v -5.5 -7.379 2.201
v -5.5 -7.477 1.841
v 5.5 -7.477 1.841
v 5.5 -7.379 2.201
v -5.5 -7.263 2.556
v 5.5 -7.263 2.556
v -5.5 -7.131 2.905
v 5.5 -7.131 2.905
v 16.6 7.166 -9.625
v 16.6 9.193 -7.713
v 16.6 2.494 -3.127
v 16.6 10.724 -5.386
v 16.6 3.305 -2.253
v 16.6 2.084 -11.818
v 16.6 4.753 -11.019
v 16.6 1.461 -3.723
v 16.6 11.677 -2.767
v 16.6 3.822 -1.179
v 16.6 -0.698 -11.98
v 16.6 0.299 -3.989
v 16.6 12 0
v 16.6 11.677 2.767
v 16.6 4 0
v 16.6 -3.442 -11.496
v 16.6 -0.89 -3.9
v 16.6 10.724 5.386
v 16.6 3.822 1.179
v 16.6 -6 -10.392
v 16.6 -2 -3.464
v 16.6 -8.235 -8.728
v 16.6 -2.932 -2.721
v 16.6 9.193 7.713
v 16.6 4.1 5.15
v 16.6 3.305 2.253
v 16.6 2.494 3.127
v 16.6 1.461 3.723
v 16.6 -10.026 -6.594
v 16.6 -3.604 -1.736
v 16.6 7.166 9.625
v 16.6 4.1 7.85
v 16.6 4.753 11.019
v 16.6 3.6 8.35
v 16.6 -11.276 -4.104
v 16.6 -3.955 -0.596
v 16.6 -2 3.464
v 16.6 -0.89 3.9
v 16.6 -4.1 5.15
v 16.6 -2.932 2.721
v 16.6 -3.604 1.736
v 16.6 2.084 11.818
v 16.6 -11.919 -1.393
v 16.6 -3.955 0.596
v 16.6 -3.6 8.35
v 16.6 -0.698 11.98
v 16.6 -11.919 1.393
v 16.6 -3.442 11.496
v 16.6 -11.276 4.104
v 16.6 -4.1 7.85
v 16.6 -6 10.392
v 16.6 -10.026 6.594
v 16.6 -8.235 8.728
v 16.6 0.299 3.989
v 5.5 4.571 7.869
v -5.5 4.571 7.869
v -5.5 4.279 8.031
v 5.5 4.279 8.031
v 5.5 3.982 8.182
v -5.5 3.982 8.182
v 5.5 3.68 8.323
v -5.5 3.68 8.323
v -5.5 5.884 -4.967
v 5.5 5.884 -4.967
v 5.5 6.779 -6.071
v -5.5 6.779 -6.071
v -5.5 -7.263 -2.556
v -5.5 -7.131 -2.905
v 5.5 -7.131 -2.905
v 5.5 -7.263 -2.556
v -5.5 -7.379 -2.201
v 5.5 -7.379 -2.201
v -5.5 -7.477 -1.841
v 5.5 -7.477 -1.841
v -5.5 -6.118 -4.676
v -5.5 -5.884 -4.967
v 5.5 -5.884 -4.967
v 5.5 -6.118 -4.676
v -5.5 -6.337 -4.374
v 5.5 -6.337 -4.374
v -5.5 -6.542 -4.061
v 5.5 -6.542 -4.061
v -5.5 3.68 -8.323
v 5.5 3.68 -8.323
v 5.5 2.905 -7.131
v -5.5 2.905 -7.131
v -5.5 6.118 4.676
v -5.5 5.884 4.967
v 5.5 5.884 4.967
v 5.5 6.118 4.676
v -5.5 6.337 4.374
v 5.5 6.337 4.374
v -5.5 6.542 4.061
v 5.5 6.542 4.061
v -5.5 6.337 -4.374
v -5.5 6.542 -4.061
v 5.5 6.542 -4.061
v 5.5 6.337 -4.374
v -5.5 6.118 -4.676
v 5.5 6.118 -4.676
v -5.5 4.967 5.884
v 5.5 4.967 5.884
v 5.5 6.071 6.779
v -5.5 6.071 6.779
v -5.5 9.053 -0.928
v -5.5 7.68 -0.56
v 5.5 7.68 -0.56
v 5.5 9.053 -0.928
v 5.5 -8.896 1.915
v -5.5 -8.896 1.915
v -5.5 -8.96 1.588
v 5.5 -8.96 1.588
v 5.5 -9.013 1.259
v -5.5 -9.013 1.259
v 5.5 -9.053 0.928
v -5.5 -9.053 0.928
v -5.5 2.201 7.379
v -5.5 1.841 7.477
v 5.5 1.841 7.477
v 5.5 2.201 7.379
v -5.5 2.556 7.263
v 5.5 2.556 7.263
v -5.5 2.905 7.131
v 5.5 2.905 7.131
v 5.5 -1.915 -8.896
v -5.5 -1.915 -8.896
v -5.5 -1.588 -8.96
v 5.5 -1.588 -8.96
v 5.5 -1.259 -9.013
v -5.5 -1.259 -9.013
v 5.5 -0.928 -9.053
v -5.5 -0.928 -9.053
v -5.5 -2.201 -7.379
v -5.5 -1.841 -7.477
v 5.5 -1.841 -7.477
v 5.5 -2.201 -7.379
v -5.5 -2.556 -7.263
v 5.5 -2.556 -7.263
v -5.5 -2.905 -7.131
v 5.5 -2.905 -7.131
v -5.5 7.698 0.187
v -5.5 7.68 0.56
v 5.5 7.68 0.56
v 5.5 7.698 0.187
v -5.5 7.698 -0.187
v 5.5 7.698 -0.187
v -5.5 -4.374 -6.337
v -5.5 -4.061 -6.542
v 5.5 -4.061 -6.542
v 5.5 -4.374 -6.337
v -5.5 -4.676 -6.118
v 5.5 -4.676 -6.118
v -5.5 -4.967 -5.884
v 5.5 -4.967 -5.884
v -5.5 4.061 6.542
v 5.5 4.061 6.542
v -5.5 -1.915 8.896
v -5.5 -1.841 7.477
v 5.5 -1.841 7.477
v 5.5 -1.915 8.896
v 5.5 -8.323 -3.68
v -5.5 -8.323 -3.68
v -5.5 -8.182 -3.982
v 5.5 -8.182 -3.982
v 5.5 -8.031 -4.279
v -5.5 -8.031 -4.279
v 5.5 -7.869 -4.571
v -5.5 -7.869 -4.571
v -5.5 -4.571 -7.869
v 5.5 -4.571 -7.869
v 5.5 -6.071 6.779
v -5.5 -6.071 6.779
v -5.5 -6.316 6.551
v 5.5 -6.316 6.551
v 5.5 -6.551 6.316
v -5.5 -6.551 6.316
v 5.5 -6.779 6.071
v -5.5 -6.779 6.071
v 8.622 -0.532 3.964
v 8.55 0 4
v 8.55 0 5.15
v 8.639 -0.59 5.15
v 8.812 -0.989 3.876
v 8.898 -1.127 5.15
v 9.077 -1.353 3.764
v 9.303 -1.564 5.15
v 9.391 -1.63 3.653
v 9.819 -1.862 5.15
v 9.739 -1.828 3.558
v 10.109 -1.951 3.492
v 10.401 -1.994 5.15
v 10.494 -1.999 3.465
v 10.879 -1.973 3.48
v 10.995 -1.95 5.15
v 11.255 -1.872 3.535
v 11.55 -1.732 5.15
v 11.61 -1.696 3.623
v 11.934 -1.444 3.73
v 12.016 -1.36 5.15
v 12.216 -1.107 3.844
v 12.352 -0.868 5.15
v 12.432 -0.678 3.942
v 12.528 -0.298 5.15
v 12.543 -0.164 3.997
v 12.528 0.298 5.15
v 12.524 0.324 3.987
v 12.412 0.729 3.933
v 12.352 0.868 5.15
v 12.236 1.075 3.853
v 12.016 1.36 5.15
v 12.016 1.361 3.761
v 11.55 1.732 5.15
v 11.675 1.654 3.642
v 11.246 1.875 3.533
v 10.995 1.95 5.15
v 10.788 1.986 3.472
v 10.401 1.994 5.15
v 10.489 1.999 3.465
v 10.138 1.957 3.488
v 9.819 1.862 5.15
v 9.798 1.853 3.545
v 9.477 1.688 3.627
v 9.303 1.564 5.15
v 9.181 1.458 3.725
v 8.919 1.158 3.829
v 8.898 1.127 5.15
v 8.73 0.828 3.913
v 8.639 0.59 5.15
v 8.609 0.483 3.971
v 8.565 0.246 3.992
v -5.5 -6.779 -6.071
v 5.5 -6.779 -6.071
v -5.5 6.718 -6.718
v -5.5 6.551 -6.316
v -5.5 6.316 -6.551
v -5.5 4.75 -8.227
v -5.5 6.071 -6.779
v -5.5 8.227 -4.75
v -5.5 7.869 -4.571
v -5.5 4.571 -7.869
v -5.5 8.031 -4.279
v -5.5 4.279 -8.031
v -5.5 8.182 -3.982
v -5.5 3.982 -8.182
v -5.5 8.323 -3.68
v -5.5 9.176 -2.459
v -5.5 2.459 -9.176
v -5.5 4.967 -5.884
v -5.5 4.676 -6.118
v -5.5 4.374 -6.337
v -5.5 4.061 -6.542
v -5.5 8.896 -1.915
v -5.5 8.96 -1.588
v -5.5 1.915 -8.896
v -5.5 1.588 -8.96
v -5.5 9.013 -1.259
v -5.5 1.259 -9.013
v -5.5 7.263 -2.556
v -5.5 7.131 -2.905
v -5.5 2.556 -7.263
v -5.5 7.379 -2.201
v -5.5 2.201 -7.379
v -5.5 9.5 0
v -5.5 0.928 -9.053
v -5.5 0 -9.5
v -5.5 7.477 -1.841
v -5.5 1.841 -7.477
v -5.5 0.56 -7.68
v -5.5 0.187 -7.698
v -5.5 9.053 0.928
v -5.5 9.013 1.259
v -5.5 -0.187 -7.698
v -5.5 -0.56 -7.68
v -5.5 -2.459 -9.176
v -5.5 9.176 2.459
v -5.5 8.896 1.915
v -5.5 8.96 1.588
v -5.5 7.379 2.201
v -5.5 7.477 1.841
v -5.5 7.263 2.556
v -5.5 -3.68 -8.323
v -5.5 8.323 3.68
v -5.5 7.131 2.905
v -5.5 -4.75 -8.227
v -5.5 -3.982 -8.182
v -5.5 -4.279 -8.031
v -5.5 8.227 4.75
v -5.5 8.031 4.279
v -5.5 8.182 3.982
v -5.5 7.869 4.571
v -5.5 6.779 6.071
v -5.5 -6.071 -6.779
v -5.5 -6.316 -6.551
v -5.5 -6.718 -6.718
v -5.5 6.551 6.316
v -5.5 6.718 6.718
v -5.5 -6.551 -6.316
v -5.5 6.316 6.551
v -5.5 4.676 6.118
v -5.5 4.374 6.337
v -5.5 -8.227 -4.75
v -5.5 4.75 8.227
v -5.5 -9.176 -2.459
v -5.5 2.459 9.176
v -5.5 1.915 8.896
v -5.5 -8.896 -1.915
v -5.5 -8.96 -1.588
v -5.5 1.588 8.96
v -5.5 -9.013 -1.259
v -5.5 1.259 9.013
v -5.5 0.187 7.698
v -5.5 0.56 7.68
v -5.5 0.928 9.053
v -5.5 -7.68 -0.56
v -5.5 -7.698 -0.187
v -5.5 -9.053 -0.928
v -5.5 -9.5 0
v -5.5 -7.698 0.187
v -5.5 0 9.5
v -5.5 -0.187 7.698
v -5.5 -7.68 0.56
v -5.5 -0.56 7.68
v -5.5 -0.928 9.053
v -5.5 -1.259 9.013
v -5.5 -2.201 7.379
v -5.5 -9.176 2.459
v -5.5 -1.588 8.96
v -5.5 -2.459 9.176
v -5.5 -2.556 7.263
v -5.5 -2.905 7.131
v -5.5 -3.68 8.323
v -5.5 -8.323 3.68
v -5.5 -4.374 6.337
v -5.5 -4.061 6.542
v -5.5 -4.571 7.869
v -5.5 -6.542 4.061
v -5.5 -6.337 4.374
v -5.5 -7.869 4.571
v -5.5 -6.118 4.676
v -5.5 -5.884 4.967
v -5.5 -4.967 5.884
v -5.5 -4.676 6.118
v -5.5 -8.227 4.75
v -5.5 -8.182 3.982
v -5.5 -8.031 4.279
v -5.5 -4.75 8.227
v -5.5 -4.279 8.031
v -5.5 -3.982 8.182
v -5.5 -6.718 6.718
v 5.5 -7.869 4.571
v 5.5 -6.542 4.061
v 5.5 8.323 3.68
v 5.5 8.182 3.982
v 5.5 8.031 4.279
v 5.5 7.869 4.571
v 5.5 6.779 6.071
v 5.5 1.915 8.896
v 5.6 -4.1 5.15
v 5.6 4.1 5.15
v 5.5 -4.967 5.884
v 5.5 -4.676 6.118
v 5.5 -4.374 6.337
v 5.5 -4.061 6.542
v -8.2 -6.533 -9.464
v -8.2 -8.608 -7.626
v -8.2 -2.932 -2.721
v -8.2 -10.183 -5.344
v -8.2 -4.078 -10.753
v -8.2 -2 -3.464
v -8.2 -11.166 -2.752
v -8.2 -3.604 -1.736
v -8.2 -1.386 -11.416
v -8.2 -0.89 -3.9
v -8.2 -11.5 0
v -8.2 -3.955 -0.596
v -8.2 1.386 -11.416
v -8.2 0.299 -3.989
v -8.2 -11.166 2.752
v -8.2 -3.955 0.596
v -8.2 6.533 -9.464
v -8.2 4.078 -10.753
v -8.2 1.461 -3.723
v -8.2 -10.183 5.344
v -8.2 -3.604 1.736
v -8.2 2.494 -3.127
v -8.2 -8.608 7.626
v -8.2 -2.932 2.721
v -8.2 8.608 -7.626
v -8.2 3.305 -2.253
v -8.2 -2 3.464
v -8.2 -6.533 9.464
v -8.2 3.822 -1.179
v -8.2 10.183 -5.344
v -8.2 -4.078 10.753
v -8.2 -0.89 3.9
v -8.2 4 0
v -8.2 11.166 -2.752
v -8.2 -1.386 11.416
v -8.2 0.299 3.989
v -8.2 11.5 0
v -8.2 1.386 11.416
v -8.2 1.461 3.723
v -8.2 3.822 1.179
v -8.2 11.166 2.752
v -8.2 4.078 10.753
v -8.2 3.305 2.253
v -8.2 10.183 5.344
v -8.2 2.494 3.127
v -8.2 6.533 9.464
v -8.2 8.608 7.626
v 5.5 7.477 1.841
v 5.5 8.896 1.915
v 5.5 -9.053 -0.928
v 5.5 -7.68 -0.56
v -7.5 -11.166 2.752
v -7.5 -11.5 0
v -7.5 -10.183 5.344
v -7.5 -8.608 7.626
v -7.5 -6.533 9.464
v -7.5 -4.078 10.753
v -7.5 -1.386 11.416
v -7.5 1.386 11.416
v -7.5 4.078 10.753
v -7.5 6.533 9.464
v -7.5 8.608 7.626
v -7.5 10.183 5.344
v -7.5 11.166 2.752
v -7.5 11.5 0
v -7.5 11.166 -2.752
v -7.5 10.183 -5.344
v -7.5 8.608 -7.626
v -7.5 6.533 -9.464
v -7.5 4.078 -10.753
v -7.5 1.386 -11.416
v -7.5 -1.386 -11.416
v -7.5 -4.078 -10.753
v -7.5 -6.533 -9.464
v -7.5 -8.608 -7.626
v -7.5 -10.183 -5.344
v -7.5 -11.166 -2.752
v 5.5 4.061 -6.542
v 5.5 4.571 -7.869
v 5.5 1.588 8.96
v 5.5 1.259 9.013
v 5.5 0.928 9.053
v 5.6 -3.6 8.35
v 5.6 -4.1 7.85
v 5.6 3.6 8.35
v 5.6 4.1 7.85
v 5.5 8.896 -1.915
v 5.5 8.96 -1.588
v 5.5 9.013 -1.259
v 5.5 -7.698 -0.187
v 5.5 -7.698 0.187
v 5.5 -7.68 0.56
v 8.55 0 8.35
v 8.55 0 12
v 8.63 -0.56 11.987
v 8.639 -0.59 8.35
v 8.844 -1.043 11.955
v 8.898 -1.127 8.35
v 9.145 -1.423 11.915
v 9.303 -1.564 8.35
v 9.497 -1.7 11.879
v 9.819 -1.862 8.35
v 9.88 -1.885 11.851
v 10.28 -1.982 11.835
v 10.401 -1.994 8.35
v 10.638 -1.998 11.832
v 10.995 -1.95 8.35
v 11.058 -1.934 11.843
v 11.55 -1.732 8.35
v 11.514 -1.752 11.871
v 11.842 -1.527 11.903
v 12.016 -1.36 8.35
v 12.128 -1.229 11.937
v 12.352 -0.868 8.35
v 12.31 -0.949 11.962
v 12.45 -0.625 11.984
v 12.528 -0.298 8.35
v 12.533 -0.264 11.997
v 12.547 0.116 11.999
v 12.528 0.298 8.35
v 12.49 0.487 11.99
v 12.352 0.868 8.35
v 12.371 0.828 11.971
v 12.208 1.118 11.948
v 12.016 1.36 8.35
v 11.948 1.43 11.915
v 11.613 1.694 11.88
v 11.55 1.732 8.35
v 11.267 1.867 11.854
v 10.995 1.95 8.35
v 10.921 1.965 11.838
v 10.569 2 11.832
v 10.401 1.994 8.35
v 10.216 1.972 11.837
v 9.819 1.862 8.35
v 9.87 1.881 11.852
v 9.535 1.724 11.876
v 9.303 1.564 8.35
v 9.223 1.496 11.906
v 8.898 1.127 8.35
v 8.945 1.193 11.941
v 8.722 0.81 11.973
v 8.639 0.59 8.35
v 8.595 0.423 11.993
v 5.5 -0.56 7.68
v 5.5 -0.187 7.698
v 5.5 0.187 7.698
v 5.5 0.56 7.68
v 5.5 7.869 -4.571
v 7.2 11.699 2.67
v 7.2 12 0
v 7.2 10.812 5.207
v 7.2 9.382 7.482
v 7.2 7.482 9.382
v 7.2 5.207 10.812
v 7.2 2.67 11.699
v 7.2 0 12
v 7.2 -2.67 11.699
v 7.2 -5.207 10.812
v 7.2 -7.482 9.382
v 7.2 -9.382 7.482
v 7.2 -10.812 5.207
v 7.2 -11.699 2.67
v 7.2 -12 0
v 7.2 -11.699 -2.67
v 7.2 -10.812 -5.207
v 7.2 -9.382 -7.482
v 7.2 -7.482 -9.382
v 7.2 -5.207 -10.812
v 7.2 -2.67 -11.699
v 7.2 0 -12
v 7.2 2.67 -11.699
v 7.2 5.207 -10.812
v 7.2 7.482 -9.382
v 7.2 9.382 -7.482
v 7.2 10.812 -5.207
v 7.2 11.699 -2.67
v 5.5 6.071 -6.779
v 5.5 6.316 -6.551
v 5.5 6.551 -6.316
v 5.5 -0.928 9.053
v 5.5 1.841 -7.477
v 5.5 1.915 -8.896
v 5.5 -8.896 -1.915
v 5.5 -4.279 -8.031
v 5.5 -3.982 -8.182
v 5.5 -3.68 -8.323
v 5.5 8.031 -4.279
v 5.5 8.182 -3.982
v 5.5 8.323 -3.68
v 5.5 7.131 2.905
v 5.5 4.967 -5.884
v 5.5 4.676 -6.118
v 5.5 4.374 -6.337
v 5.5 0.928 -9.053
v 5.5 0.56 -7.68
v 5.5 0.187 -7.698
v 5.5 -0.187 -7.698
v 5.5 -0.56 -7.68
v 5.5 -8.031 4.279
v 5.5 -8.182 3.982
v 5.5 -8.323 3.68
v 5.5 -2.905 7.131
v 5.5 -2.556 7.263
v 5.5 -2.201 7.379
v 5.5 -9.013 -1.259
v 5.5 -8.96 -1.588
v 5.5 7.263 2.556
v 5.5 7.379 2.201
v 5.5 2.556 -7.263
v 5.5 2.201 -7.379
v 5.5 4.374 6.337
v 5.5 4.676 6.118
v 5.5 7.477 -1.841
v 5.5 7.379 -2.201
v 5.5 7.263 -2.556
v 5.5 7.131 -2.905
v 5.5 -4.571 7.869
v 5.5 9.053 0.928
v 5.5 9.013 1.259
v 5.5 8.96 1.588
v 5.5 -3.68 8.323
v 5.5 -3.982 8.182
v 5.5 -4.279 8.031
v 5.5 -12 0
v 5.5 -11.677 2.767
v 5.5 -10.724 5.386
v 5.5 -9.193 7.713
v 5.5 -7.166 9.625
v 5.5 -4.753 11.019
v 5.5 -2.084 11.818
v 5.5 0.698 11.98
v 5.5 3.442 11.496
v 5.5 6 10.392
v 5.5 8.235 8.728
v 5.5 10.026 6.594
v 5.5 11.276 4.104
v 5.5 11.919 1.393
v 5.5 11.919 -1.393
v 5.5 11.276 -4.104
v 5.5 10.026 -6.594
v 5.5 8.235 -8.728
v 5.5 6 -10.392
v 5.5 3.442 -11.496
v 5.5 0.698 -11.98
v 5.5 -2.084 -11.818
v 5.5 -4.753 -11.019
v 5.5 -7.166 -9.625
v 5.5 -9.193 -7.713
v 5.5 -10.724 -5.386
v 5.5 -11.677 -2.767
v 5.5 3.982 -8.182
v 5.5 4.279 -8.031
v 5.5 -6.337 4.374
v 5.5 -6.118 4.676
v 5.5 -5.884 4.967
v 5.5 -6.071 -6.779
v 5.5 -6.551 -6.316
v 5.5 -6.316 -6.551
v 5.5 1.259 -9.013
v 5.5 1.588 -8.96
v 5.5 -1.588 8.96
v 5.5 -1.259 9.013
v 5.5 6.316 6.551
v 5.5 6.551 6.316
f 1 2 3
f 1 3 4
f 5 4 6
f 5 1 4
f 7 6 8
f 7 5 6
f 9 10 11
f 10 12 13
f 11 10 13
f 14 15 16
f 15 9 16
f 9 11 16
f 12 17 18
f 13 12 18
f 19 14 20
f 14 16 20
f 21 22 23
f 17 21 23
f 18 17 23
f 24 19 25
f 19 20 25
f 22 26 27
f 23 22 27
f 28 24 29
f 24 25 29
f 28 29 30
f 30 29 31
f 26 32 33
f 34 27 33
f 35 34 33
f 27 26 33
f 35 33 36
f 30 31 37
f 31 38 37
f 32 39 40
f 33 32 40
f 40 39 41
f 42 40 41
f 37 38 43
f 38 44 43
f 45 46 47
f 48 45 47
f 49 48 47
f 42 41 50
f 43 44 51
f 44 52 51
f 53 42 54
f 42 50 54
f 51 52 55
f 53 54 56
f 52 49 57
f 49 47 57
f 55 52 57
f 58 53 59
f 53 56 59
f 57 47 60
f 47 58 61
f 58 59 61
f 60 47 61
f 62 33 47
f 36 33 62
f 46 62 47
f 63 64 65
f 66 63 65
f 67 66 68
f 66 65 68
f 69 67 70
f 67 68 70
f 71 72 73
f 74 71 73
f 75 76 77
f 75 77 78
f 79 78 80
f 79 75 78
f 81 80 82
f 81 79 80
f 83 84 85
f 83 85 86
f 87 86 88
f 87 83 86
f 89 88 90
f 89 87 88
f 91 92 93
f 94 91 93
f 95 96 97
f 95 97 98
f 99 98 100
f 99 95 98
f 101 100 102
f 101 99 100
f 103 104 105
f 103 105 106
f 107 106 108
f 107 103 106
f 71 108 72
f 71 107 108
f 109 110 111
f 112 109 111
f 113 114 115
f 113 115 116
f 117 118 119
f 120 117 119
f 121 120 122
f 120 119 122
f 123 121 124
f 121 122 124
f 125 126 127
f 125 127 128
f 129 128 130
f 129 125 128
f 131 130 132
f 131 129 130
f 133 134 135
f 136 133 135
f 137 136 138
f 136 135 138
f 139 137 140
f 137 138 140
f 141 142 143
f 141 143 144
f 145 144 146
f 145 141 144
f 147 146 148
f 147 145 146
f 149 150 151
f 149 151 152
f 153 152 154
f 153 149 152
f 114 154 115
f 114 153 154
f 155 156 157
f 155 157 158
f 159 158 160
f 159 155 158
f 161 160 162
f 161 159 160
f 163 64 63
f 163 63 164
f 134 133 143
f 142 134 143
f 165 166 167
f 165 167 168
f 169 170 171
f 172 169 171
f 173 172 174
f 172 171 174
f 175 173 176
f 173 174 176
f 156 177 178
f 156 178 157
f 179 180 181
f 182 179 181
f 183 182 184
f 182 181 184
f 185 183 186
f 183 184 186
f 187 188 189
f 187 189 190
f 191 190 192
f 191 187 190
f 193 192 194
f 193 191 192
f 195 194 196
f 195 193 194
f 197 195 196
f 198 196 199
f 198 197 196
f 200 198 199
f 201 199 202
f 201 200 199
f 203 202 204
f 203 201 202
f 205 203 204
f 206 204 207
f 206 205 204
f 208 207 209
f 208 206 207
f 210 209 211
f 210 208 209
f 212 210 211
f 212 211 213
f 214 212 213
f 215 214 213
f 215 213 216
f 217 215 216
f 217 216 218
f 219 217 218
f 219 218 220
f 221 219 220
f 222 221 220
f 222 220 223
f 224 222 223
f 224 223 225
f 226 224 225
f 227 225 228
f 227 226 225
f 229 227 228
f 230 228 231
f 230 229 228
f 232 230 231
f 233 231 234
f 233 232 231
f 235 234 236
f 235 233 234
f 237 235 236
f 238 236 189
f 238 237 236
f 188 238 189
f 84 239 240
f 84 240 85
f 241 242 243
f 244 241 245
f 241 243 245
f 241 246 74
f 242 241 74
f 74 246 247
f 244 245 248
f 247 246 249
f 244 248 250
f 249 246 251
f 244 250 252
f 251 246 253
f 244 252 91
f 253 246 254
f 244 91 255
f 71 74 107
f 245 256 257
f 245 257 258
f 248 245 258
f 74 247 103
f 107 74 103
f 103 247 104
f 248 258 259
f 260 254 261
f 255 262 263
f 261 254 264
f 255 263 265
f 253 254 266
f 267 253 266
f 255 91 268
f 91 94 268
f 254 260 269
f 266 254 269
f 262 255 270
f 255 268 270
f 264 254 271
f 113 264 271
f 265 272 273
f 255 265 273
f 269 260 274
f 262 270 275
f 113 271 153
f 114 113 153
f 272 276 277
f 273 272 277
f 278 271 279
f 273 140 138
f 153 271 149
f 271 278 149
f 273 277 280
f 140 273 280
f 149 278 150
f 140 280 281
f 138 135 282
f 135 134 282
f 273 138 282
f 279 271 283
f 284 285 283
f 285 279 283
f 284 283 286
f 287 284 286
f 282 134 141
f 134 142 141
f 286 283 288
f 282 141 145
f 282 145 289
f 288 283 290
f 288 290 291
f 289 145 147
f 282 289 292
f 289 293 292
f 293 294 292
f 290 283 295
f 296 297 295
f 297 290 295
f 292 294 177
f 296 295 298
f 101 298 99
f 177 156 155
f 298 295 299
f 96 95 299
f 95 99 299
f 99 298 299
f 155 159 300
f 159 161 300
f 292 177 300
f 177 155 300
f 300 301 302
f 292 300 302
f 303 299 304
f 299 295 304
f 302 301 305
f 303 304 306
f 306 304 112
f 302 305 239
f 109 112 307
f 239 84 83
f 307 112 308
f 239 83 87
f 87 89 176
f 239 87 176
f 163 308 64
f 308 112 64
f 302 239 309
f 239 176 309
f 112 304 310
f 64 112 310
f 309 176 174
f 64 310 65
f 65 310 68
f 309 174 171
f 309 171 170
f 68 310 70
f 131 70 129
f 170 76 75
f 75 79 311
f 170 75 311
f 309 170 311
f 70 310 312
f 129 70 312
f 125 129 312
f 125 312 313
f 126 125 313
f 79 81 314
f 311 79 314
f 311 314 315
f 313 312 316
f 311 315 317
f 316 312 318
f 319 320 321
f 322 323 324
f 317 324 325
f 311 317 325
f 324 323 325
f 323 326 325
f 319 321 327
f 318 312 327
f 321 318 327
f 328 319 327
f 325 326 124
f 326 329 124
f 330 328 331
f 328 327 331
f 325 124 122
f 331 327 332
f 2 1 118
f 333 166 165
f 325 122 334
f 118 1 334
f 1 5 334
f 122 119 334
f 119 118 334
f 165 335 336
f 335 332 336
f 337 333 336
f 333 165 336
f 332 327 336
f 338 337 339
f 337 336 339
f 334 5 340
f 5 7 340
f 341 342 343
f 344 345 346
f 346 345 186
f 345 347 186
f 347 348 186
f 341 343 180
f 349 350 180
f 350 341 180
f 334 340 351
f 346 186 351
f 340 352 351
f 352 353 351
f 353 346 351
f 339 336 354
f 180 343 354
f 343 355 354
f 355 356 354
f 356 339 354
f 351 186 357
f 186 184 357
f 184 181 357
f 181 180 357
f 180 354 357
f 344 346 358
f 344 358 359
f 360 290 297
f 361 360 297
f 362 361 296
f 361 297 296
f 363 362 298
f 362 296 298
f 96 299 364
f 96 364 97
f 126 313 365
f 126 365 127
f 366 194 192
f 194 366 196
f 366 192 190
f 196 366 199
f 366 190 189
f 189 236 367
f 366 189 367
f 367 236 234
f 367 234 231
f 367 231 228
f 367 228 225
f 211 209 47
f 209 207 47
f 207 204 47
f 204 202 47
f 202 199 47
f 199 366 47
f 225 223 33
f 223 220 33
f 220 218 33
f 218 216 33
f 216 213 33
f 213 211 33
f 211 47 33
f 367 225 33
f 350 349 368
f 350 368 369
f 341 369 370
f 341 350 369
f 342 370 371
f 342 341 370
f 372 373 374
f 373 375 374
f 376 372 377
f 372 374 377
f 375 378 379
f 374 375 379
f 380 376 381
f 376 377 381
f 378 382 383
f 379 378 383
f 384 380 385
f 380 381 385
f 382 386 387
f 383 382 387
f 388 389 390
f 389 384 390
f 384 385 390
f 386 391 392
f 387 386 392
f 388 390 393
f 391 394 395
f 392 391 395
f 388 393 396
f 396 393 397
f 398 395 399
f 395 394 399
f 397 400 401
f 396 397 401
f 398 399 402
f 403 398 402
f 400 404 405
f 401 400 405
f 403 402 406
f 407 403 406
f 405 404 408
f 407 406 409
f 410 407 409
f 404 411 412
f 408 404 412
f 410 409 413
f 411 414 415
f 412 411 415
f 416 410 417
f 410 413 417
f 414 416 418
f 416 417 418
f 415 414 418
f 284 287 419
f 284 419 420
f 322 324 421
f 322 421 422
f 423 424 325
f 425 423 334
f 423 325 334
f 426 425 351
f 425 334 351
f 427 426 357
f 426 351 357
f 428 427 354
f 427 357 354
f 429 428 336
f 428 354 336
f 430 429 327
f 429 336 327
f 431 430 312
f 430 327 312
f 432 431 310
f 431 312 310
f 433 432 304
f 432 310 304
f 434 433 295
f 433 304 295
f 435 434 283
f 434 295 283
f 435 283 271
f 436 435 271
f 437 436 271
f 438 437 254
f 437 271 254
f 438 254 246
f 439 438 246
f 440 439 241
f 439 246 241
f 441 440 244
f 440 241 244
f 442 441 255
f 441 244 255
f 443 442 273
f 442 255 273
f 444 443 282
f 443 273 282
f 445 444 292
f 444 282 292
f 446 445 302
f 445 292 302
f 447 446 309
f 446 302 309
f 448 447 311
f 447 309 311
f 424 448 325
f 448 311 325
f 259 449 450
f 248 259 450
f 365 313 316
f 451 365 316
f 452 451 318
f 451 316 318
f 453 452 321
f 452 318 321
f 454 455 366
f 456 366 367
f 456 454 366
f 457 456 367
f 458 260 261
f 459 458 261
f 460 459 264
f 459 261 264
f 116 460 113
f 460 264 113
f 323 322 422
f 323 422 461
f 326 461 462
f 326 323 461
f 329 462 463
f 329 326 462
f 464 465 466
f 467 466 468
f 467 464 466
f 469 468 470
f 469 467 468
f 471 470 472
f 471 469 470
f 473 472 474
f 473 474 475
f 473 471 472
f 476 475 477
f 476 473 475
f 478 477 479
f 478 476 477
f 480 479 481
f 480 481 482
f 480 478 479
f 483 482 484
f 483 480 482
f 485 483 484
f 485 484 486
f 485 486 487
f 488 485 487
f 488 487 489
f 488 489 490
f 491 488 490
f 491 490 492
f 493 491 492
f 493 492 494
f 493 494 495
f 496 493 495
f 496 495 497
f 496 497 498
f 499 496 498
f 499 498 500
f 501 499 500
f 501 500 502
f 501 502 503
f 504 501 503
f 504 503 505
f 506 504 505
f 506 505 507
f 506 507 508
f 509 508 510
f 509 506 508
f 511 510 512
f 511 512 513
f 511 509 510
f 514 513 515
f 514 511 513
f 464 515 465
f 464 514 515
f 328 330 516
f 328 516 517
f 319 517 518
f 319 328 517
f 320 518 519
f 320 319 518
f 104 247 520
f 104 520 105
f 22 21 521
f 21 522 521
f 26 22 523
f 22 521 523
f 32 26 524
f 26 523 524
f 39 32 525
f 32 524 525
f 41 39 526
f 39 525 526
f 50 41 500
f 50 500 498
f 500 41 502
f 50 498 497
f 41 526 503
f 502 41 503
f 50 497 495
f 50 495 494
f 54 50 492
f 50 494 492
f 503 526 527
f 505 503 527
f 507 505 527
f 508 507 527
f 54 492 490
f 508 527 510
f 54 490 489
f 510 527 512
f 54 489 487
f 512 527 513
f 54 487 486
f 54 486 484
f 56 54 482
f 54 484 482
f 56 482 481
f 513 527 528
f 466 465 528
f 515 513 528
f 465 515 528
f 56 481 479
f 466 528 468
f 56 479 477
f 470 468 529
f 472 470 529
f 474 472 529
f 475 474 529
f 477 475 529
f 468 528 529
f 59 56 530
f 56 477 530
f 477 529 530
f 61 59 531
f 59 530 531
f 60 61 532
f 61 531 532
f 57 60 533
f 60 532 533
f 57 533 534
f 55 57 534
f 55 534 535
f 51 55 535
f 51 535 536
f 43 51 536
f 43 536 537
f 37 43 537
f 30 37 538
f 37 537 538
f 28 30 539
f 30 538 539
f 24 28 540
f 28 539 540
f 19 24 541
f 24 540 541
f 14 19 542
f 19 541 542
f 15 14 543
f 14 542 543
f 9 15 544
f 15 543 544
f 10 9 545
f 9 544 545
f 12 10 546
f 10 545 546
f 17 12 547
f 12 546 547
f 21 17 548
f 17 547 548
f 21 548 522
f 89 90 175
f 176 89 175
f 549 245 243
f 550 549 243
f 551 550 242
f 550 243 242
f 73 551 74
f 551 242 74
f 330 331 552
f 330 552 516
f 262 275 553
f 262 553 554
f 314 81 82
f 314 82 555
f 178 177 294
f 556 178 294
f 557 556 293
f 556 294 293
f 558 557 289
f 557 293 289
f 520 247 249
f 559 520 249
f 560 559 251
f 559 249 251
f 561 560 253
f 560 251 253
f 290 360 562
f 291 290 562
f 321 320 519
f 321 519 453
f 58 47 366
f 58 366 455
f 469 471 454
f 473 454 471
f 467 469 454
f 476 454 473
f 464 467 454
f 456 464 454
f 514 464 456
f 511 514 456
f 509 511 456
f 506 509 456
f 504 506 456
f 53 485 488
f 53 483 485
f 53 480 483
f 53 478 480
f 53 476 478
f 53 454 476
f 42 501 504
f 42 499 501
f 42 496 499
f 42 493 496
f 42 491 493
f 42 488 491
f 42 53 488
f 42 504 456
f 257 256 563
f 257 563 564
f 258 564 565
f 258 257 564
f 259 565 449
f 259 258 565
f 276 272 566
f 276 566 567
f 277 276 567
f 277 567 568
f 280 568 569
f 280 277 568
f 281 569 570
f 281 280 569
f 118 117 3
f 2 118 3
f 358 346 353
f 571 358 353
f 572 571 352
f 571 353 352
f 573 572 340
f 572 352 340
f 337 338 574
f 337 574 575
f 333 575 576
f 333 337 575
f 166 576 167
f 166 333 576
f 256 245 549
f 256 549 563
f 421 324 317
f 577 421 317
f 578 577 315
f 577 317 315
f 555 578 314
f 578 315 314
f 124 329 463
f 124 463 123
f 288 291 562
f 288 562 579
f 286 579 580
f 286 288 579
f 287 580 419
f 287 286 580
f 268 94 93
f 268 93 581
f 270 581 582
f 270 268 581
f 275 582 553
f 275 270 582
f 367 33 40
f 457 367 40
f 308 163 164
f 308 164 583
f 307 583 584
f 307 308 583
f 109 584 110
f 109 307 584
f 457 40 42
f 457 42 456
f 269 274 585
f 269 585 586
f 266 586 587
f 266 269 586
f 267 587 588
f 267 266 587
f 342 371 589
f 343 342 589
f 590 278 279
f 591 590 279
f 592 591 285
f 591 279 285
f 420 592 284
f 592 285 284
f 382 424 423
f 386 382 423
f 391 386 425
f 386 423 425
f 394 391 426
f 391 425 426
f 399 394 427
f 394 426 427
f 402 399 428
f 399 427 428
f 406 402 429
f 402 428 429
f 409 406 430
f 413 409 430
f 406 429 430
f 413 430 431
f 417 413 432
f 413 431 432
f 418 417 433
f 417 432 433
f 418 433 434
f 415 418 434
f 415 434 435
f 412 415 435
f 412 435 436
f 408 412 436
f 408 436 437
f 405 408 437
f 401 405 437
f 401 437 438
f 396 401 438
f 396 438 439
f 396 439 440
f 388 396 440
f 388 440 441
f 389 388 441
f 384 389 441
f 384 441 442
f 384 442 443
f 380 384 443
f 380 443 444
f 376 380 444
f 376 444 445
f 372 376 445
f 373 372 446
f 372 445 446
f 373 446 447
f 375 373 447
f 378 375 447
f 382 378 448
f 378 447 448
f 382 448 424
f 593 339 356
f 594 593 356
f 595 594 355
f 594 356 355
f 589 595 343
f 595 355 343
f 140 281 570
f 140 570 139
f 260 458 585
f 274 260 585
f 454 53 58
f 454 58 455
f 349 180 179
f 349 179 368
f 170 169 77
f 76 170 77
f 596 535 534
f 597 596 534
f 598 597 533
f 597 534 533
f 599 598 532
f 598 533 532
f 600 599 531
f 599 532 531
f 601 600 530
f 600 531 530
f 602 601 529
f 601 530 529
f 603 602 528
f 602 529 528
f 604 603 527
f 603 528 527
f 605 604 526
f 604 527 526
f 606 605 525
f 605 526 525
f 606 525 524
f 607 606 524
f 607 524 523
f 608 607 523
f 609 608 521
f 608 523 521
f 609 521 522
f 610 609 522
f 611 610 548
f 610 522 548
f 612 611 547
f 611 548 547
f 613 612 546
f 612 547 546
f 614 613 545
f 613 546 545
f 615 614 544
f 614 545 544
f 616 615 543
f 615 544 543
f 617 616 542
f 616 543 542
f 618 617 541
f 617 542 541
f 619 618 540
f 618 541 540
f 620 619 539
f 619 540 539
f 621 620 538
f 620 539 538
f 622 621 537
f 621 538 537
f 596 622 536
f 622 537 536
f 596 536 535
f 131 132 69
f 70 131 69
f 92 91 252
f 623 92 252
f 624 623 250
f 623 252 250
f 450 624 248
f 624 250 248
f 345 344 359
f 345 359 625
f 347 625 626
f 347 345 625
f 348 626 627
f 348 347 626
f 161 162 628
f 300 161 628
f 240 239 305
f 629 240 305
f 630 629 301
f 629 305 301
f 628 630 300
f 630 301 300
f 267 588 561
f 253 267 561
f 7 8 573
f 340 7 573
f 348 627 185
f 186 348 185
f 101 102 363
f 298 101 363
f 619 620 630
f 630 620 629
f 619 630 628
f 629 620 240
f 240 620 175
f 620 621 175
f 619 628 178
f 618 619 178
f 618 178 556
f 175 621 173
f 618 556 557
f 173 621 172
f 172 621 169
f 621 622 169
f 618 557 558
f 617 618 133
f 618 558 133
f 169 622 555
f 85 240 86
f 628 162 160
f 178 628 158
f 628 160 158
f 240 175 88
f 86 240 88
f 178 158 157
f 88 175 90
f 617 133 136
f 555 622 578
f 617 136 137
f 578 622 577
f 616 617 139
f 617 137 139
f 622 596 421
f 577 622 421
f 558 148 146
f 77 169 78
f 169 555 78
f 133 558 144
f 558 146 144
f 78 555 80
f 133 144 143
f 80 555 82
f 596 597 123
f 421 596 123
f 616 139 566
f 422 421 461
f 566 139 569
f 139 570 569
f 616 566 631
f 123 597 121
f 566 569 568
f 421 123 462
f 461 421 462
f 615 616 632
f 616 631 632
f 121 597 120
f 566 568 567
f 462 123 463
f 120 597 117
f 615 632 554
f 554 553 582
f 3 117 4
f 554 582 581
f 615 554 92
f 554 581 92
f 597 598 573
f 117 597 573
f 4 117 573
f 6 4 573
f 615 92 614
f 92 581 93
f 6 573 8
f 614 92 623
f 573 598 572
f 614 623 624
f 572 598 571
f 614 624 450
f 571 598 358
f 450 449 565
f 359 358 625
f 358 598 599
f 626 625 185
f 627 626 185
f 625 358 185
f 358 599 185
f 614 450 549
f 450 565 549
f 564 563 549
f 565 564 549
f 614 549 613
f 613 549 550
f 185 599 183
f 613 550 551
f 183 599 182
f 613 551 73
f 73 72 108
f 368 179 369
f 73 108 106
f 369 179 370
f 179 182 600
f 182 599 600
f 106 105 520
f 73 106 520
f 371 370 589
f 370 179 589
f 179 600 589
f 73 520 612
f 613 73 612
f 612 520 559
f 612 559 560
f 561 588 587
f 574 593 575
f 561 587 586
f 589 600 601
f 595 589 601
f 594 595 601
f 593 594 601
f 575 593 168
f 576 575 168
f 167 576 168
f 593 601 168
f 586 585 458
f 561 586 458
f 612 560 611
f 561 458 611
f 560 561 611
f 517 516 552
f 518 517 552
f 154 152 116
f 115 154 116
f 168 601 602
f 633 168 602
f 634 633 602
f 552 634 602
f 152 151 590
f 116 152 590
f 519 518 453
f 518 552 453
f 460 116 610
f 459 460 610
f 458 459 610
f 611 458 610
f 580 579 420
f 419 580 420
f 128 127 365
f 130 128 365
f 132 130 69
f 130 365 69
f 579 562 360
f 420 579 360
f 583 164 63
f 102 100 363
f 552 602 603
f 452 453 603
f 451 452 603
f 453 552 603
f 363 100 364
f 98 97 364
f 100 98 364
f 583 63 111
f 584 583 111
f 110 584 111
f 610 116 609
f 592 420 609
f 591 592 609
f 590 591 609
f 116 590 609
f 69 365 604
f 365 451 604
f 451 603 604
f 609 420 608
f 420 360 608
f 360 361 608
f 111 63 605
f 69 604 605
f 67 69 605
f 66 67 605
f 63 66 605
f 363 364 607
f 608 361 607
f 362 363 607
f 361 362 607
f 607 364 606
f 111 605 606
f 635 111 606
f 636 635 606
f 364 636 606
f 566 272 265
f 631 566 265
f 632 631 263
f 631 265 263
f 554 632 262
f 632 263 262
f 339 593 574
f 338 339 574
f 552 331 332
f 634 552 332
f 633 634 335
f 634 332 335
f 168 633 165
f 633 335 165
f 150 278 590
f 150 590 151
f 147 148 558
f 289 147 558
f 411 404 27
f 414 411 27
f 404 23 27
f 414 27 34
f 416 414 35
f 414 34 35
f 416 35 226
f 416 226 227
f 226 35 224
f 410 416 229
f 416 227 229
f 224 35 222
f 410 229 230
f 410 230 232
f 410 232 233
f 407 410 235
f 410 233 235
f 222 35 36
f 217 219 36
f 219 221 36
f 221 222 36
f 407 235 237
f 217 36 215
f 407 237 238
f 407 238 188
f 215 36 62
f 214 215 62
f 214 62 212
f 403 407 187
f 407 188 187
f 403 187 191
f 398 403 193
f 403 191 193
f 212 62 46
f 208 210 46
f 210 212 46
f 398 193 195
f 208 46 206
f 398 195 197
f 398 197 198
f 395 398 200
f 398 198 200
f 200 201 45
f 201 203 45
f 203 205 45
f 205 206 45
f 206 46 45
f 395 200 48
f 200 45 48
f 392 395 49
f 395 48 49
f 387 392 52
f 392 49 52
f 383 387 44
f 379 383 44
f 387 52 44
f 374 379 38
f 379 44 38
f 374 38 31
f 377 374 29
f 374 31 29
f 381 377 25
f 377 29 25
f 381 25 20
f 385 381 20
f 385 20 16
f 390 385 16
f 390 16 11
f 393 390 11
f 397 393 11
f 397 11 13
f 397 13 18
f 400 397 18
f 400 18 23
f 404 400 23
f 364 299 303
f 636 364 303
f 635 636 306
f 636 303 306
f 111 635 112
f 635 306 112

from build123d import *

# Parameters (mm, degrees)
F3_DEPTH      = 182.88
F3_DEPTH_BACK = 182.88
F4_W          = 43.18
F4_H          = 292.1
F4_H_2        = 12.7
F6_DEPTH      = 365.761
F9_DEPTH      = 304.801
F7_W          = 208.28
F7_H          = 81.28
F10_DEPTH     = 279.4
F11_SIZE      = 12.7
F12_SCALE     = 0.0393700787
F13_DEPTH     = 1
F14_SIZE      = 2


with BuildPart() as f1:
    # F0 (on Top) → F1 (revolve)
    with BuildSketch(Plane.XY):
        Polygon((182.88, 231.14), (-182.88, 231.14), (-182.88, 101.6), (421.64, 101.6), (421.64, 304.8), (182.88, 304.8), align=None)
    revolve(axis=Axis((286.554813385, 0, 0), (1, 0, 0)))

    # F2 (on Right) → F3 (cut, two sides)
    with BuildSketch(Plane.YZ) as f3_sk:
        with BuildLine():
            Line((-46.7577635634, 189.9085252076), (-48.6472827621, 225.9626993109))
            ThreePointArc((-48.6472827621, 225.9626993109), (-71.4261880798, 219.8272031765), (-93.4610637385, 211.401819209))
            Line((-93.4610637385, 211.401819209), (-73.7976050599, 181.1227481224))
            ThreePointArc((-73.7976050599, 181.1227481224), (-60.4375437599, 186.007633457), (-46.7577635634, 189.9085252076))
        make_face()
        with BuildLine():
            Line((14.2156859414, 195.0626839588), (23.559998911, 229.9361347229))
            ThreePointArc((23.559998911, 229.9361347229), (0, 231.14), (-23.559998911, 229.9361347229))
            Line((-23.559998911, 229.9361347229), (-14.2156859414, 195.0626839588))
            ThreePointArc((-14.2156859414, 195.0626839588), (0, 195.58), (14.2156859414, 195.0626839588))
        make_face()
        with BuildLine():
            ThreePointArc((93.4610637385, 211.401819209), (71.4261880798, 219.8272031765), (48.6472827621, 225.9626993109))
            Line((48.6472827621, 225.9626993109), (46.7577635634, 189.9085252076))
            ThreePointArc((46.7577635634, 189.9085252076), (60.4375437599, 186.007633457), (73.7976050599, 181.1227481224))
            Line((73.7976050599, 181.1227481224), (93.4610637385, 211.401819209))
        make_face()
        with BuildLine():
            ThreePointArc((154.2135084657, 172.1740207078), (135.8606832149, 186.9961880798), (116.0926294528, 199.8704605156))
            Line((116.0926294528, 199.8704605156), (103.1542373903, 166.1647968387))
            ThreePointArc((103.1542373903, 166.1647968387), (114.9590396434, 158.2275437599), (126.1557004169, 149.4532557435))
            Line((126.1557004169, 149.4532557435), (154.2135084657, 172.1740207078))
        make_face()
        with BuildLine():
            ThreePointArc((199.8704605156, 116.0926294528), (186.9961880798, 135.8606832149), (172.1740207078, 154.2135084657))
            Line((172.1740207078, 154.2135084657), (149.4532557435, 126.1557004169))
            ThreePointArc((149.4532557435, 126.1557004169), (158.2275437599, 114.9590396434), (166.1647968387, 103.1542373903))
            Line((166.1647968387, 103.1542373903), (199.8704605156, 116.0926294528))
        make_face()
        with BuildLine():
            ThreePointArc((225.9626993109, 48.6472827621), (219.8272031765, 71.4261880798), (211.401819209, 93.4610637385))
            Line((211.401819209, 93.4610637385), (181.1227481224, 73.7976050599))
            ThreePointArc((181.1227481224, 73.7976050599), (186.007633457, 60.4375437599), (189.9085252076, 46.7577635634))
            Line((189.9085252076, 46.7577635634), (225.9626993109, 48.6472827621))
        make_face()
        with BuildLine():
            ThreePointArc((231.14, 0), (230.8388374818, 11.7953681618), (229.9361347229, 23.559998911))
            Line((229.9361347229, 23.559998911), (195.0626839588, 14.2156859414))
            ThreePointArc((195.0626839588, 14.2156859414), (195.4506282014, 7.1125477621), (195.58, 0))
            ThreePointArc((195.58, 0), (195.4506282014, -7.1125477621), (195.0626839588, -14.2156859414))
            Line((195.0626839588, -14.2156859414), (229.9361347229, -23.559998911))
            ThreePointArc((229.9361347229, -23.559998911), (230.8388374818, -11.7953681618), (231.14, 0))
        make_face()
        with BuildLine():
            ThreePointArc((211.401819209, -93.4610637385), (219.8272031765, -71.4261880798), (225.9626993109, -48.6472827621))
            Line((225.9626993109, -48.6472827621), (189.9085252076, -46.7577635635))
            ThreePointArc((189.9085252076, -46.7577635635), (186.007633457, -60.4375437599), (181.1227481224, -73.7976050599))
            Line((181.1227481224, -73.7976050599), (211.401819209, -93.4610637385))
        make_face()
        with BuildLine():
            ThreePointArc((172.1740207078, -154.2135084657), (186.9961880798, -135.8606832149), (199.8704605156, -116.0926294528))
            Line((199.8704605156, -116.0926294528), (166.1647968387, -103.1542373903))
            ThreePointArc((166.1647968387, -103.1542373903), (158.2275437599, -114.9590396434), (149.4532557435, -126.1557004169))
            Line((149.4532557435, -126.1557004169), (172.1740207078, -154.2135084657))
        make_face()
        with BuildLine():
            ThreePointArc((116.0926294528, -199.8704605156), (135.8606832149, -186.9961880798), (154.2135084657, -172.1740207078))
            Line((154.2135084657, -172.1740207078), (126.1557004169, -149.4532557435))
            ThreePointArc((126.1557004169, -149.4532557435), (114.9590396434, -158.2275437599), (103.1542373903, -166.1647968387))
            Line((103.1542373903, -166.1647968387), (116.0926294528, -199.8704605156))
        make_face()
        with BuildLine():
            ThreePointArc((48.6472827621, -225.9626993109), (71.4261880798, -219.8272031765), (93.4610637385, -211.401819209))
            Line((93.4610637385, -211.401819209), (73.7976050599, -181.1227481224))
            ThreePointArc((73.7976050599, -181.1227481224), (60.4375437599, -186.007633457), (46.7577635634, -189.9085252076))
            Line((46.7577635634, -189.9085252076), (48.6472827621, -225.9626993109))
        make_face()
        with BuildLine():
            ThreePointArc((-23.559998911, -229.9361347229), (0, -231.14), (23.559998911, -229.9361347229))
            Line((23.559998911, -229.9361347229), (14.2156859414, -195.0626839588))
            ThreePointArc((14.2156859414, -195.0626839588), (0, -195.58), (-14.2156859414, -195.0626839588))
            Line((-14.2156859414, -195.0626839588), (-23.559998911, -229.9361347229))
        make_face()
        with BuildLine():
            Line((-73.7976050599, -181.1227481224), (-93.4610637385, -211.401819209))
            ThreePointArc((-93.4610637385, -211.401819209), (-71.4261880798, -219.8272031765), (-48.6472827621, -225.9626993109))
            Line((-48.6472827621, -225.9626993109), (-46.7577635635, -189.9085252076))
            ThreePointArc((-46.7577635635, -189.9085252076), (-60.4375437599, -186.007633457), (-73.7976050599, -181.1227481224))
        make_face()
        with BuildLine():
            Line((-126.1557004169, -149.4532557435), (-154.2135084657, -172.1740207078))
            ThreePointArc((-154.2135084657, -172.1740207078), (-135.8606832149, -186.9961880798), (-116.0926294528, -199.8704605156))
            Line((-116.0926294528, -199.8704605156), (-103.1542373903, -166.1647968387))
            ThreePointArc((-103.1542373903, -166.1647968387), (-114.9590396434, -158.2275437599), (-126.1557004169, -149.4532557435))
        make_face()
        with BuildLine():
            Line((-166.1647968387, -103.1542373903), (-199.8704605156, -116.0926294528))
            ThreePointArc((-199.8704605156, -116.0926294528), (-186.9961880798, -135.8606832149), (-172.1740207078, -154.2135084657))
            Line((-172.1740207078, -154.2135084657), (-149.4532557435, -126.1557004169))
            ThreePointArc((-149.4532557435, -126.1557004169), (-158.2275437599, -114.9590396434), (-166.1647968387, -103.1542373903))
        make_face()
        with BuildLine():
            Line((-189.9085252076, -46.7577635634), (-225.9626993109, -48.6472827621))
            ThreePointArc((-225.9626993109, -48.6472827621), (-219.8272031765, -71.4261880798), (-211.401819209, -93.4610637385))
            Line((-211.401819209, -93.4610637385), (-181.1227481224, -73.7976050599))
            ThreePointArc((-181.1227481224, -73.7976050599), (-186.007633457, -60.4375437599), (-189.9085252076, -46.7577635634))
        make_face()
        with BuildLine():
            Line((-195.0626839588, 14.2156859414), (-229.9361347229, 23.559998911))
            ThreePointArc((-229.9361347229, 23.559998911), (-231.14, 0), (-229.9361347229, -23.559998911))
            Line((-229.9361347229, -23.559998911), (-195.0626839588, -14.2156859414))
            ThreePointArc((-195.0626839588, -14.2156859414), (-195.58, 0), (-195.0626839588, 14.2156859414))
        make_face()
        with BuildLine():
            Line((-181.1227481224, 73.7976050599), (-211.401819209, 93.4610637385))
            ThreePointArc((-211.401819209, 93.4610637385), (-219.8272031765, 71.4261880798), (-225.9626993109, 48.6472827621))
            Line((-225.9626993109, 48.6472827621), (-189.9085252076, 46.7577635634))
            ThreePointArc((-189.9085252076, 46.7577635635), (-186.007633457, 60.4375437599), (-181.1227481224, 73.7976050599))
        make_face()
        with BuildLine():
            Line((-149.4532557435, 126.1557004169), (-172.1740207078, 154.2135084657))
            ThreePointArc((-172.1740207078, 154.2135084657), (-186.9961880798, 135.8606832149), (-199.8704605156, 116.0926294528))
            Line((-199.8704605156, 116.0926294528), (-166.1647968387, 103.1542373903))
            ThreePointArc((-166.1647968387, 103.1542373903), (-158.2275437599, 114.9590396434), (-149.4532557435, 126.1557004169))
        make_face()
        with BuildLine():
            Line((-103.1542373903, 166.1647968387), (-116.0926294528, 199.8704605156))
            ThreePointArc((-116.0926294528, 199.8704605156), (-135.8606832149, 186.9961880798), (-154.2135084657, 172.1740207078))
            Line((-154.2135084657, 172.1740207078), (-126.1557004169, 149.4532557435))
            ThreePointArc((-126.1557004169, 149.4532557435), (-114.9590396434, 158.2275437599), (-103.1542373903, 166.1647968387))
        make_face()
    extrude(amount=-F3_DEPTH, mode=Mode.SUBTRACT)
    extrude(f3_sk.sketch, amount=F3_DEPTH_BACK, mode=Mode.SUBTRACT)

    # F4 (on Top) → F5 (revolve)
    with BuildSketch(Plane.XY):
        Polygon((-139.7, 0), (-182.88, 0), (-182.88, -14.2156859414), (-182.88, -292.1), (-139.7, -292.1), align=None)
        with Locations((161.29, -146.05)):
            Rectangle(F4_W, F4_H)
        with Locations((161.29, -298.45)):
            Rectangle(F4_W, F4_H_2)
    revolve(axis=Axis((-161.29, 0, 0), (-1, 0, 0)))

    # F6 (cut, through all): a face of the model
    f6_faces = [f1.faces().sort_by_distance(p)[0] for p in [
        (182.88, 0, 0),
    ]]
    extrude(f6_faces, amount=-F6_DEPTH, mode=Mode.SUBTRACT)

    # F8 (on Top) → F9 (cut, through all)
    with BuildSketch(Plane.XY):
        with BuildLine():
            Line((217.17, 0), (318.77, 0))
            ThreePointArc((318.77, 0), (267.97, 50.8), (217.17, 0))
        make_face()
        with BuildLine():
            ThreePointArc((217.17, 0), (267.97, -50.8), (318.77, 0))
            Line((318.77, 0), (217.17, 0))
        make_face()
    extrude(amount=F9_DEPTH, mode=Mode.SUBTRACT)

    # F7 (on face) → F10 (cut)
    with BuildSketch(Plane.YZ.offset(421.64)):
        with Locations((0, 171.45)):
            Rectangle(F7_W, F7_H)
    extrude(amount=-F10_DEPTH, mode=Mode.SUBTRACT)

    # F11
    f11_edges = [f1.edges().sort_by_distance(p)[0] for p in [
        (281.94, -104.14, 212.09),
        (281.94, 104.14, 212.09),
    ]]
    chamfer(f11_edges, length=F11_SIZE)


with BuildPart() as f1_1:
    # F12: moved
    add(f1.part.scale(F12_SCALE))

    # F13 (add): a face of the model
    f13_faces = [f1_1.faces().sort_by_distance(p)[0] for p in [
        (-7.2, 11.1747308807, 0),
    ]]
    extrude(f13_faces, amount=F13_DEPTH)

    # F14
    f14_edges = [f1_1.edges().sort_by_distance(p)[0] for p in [
        (-5.5, 11.5, 0),
    ]]
    chamfer(f14_edges, length=F14_SIZE)


solid = f1_1.part
